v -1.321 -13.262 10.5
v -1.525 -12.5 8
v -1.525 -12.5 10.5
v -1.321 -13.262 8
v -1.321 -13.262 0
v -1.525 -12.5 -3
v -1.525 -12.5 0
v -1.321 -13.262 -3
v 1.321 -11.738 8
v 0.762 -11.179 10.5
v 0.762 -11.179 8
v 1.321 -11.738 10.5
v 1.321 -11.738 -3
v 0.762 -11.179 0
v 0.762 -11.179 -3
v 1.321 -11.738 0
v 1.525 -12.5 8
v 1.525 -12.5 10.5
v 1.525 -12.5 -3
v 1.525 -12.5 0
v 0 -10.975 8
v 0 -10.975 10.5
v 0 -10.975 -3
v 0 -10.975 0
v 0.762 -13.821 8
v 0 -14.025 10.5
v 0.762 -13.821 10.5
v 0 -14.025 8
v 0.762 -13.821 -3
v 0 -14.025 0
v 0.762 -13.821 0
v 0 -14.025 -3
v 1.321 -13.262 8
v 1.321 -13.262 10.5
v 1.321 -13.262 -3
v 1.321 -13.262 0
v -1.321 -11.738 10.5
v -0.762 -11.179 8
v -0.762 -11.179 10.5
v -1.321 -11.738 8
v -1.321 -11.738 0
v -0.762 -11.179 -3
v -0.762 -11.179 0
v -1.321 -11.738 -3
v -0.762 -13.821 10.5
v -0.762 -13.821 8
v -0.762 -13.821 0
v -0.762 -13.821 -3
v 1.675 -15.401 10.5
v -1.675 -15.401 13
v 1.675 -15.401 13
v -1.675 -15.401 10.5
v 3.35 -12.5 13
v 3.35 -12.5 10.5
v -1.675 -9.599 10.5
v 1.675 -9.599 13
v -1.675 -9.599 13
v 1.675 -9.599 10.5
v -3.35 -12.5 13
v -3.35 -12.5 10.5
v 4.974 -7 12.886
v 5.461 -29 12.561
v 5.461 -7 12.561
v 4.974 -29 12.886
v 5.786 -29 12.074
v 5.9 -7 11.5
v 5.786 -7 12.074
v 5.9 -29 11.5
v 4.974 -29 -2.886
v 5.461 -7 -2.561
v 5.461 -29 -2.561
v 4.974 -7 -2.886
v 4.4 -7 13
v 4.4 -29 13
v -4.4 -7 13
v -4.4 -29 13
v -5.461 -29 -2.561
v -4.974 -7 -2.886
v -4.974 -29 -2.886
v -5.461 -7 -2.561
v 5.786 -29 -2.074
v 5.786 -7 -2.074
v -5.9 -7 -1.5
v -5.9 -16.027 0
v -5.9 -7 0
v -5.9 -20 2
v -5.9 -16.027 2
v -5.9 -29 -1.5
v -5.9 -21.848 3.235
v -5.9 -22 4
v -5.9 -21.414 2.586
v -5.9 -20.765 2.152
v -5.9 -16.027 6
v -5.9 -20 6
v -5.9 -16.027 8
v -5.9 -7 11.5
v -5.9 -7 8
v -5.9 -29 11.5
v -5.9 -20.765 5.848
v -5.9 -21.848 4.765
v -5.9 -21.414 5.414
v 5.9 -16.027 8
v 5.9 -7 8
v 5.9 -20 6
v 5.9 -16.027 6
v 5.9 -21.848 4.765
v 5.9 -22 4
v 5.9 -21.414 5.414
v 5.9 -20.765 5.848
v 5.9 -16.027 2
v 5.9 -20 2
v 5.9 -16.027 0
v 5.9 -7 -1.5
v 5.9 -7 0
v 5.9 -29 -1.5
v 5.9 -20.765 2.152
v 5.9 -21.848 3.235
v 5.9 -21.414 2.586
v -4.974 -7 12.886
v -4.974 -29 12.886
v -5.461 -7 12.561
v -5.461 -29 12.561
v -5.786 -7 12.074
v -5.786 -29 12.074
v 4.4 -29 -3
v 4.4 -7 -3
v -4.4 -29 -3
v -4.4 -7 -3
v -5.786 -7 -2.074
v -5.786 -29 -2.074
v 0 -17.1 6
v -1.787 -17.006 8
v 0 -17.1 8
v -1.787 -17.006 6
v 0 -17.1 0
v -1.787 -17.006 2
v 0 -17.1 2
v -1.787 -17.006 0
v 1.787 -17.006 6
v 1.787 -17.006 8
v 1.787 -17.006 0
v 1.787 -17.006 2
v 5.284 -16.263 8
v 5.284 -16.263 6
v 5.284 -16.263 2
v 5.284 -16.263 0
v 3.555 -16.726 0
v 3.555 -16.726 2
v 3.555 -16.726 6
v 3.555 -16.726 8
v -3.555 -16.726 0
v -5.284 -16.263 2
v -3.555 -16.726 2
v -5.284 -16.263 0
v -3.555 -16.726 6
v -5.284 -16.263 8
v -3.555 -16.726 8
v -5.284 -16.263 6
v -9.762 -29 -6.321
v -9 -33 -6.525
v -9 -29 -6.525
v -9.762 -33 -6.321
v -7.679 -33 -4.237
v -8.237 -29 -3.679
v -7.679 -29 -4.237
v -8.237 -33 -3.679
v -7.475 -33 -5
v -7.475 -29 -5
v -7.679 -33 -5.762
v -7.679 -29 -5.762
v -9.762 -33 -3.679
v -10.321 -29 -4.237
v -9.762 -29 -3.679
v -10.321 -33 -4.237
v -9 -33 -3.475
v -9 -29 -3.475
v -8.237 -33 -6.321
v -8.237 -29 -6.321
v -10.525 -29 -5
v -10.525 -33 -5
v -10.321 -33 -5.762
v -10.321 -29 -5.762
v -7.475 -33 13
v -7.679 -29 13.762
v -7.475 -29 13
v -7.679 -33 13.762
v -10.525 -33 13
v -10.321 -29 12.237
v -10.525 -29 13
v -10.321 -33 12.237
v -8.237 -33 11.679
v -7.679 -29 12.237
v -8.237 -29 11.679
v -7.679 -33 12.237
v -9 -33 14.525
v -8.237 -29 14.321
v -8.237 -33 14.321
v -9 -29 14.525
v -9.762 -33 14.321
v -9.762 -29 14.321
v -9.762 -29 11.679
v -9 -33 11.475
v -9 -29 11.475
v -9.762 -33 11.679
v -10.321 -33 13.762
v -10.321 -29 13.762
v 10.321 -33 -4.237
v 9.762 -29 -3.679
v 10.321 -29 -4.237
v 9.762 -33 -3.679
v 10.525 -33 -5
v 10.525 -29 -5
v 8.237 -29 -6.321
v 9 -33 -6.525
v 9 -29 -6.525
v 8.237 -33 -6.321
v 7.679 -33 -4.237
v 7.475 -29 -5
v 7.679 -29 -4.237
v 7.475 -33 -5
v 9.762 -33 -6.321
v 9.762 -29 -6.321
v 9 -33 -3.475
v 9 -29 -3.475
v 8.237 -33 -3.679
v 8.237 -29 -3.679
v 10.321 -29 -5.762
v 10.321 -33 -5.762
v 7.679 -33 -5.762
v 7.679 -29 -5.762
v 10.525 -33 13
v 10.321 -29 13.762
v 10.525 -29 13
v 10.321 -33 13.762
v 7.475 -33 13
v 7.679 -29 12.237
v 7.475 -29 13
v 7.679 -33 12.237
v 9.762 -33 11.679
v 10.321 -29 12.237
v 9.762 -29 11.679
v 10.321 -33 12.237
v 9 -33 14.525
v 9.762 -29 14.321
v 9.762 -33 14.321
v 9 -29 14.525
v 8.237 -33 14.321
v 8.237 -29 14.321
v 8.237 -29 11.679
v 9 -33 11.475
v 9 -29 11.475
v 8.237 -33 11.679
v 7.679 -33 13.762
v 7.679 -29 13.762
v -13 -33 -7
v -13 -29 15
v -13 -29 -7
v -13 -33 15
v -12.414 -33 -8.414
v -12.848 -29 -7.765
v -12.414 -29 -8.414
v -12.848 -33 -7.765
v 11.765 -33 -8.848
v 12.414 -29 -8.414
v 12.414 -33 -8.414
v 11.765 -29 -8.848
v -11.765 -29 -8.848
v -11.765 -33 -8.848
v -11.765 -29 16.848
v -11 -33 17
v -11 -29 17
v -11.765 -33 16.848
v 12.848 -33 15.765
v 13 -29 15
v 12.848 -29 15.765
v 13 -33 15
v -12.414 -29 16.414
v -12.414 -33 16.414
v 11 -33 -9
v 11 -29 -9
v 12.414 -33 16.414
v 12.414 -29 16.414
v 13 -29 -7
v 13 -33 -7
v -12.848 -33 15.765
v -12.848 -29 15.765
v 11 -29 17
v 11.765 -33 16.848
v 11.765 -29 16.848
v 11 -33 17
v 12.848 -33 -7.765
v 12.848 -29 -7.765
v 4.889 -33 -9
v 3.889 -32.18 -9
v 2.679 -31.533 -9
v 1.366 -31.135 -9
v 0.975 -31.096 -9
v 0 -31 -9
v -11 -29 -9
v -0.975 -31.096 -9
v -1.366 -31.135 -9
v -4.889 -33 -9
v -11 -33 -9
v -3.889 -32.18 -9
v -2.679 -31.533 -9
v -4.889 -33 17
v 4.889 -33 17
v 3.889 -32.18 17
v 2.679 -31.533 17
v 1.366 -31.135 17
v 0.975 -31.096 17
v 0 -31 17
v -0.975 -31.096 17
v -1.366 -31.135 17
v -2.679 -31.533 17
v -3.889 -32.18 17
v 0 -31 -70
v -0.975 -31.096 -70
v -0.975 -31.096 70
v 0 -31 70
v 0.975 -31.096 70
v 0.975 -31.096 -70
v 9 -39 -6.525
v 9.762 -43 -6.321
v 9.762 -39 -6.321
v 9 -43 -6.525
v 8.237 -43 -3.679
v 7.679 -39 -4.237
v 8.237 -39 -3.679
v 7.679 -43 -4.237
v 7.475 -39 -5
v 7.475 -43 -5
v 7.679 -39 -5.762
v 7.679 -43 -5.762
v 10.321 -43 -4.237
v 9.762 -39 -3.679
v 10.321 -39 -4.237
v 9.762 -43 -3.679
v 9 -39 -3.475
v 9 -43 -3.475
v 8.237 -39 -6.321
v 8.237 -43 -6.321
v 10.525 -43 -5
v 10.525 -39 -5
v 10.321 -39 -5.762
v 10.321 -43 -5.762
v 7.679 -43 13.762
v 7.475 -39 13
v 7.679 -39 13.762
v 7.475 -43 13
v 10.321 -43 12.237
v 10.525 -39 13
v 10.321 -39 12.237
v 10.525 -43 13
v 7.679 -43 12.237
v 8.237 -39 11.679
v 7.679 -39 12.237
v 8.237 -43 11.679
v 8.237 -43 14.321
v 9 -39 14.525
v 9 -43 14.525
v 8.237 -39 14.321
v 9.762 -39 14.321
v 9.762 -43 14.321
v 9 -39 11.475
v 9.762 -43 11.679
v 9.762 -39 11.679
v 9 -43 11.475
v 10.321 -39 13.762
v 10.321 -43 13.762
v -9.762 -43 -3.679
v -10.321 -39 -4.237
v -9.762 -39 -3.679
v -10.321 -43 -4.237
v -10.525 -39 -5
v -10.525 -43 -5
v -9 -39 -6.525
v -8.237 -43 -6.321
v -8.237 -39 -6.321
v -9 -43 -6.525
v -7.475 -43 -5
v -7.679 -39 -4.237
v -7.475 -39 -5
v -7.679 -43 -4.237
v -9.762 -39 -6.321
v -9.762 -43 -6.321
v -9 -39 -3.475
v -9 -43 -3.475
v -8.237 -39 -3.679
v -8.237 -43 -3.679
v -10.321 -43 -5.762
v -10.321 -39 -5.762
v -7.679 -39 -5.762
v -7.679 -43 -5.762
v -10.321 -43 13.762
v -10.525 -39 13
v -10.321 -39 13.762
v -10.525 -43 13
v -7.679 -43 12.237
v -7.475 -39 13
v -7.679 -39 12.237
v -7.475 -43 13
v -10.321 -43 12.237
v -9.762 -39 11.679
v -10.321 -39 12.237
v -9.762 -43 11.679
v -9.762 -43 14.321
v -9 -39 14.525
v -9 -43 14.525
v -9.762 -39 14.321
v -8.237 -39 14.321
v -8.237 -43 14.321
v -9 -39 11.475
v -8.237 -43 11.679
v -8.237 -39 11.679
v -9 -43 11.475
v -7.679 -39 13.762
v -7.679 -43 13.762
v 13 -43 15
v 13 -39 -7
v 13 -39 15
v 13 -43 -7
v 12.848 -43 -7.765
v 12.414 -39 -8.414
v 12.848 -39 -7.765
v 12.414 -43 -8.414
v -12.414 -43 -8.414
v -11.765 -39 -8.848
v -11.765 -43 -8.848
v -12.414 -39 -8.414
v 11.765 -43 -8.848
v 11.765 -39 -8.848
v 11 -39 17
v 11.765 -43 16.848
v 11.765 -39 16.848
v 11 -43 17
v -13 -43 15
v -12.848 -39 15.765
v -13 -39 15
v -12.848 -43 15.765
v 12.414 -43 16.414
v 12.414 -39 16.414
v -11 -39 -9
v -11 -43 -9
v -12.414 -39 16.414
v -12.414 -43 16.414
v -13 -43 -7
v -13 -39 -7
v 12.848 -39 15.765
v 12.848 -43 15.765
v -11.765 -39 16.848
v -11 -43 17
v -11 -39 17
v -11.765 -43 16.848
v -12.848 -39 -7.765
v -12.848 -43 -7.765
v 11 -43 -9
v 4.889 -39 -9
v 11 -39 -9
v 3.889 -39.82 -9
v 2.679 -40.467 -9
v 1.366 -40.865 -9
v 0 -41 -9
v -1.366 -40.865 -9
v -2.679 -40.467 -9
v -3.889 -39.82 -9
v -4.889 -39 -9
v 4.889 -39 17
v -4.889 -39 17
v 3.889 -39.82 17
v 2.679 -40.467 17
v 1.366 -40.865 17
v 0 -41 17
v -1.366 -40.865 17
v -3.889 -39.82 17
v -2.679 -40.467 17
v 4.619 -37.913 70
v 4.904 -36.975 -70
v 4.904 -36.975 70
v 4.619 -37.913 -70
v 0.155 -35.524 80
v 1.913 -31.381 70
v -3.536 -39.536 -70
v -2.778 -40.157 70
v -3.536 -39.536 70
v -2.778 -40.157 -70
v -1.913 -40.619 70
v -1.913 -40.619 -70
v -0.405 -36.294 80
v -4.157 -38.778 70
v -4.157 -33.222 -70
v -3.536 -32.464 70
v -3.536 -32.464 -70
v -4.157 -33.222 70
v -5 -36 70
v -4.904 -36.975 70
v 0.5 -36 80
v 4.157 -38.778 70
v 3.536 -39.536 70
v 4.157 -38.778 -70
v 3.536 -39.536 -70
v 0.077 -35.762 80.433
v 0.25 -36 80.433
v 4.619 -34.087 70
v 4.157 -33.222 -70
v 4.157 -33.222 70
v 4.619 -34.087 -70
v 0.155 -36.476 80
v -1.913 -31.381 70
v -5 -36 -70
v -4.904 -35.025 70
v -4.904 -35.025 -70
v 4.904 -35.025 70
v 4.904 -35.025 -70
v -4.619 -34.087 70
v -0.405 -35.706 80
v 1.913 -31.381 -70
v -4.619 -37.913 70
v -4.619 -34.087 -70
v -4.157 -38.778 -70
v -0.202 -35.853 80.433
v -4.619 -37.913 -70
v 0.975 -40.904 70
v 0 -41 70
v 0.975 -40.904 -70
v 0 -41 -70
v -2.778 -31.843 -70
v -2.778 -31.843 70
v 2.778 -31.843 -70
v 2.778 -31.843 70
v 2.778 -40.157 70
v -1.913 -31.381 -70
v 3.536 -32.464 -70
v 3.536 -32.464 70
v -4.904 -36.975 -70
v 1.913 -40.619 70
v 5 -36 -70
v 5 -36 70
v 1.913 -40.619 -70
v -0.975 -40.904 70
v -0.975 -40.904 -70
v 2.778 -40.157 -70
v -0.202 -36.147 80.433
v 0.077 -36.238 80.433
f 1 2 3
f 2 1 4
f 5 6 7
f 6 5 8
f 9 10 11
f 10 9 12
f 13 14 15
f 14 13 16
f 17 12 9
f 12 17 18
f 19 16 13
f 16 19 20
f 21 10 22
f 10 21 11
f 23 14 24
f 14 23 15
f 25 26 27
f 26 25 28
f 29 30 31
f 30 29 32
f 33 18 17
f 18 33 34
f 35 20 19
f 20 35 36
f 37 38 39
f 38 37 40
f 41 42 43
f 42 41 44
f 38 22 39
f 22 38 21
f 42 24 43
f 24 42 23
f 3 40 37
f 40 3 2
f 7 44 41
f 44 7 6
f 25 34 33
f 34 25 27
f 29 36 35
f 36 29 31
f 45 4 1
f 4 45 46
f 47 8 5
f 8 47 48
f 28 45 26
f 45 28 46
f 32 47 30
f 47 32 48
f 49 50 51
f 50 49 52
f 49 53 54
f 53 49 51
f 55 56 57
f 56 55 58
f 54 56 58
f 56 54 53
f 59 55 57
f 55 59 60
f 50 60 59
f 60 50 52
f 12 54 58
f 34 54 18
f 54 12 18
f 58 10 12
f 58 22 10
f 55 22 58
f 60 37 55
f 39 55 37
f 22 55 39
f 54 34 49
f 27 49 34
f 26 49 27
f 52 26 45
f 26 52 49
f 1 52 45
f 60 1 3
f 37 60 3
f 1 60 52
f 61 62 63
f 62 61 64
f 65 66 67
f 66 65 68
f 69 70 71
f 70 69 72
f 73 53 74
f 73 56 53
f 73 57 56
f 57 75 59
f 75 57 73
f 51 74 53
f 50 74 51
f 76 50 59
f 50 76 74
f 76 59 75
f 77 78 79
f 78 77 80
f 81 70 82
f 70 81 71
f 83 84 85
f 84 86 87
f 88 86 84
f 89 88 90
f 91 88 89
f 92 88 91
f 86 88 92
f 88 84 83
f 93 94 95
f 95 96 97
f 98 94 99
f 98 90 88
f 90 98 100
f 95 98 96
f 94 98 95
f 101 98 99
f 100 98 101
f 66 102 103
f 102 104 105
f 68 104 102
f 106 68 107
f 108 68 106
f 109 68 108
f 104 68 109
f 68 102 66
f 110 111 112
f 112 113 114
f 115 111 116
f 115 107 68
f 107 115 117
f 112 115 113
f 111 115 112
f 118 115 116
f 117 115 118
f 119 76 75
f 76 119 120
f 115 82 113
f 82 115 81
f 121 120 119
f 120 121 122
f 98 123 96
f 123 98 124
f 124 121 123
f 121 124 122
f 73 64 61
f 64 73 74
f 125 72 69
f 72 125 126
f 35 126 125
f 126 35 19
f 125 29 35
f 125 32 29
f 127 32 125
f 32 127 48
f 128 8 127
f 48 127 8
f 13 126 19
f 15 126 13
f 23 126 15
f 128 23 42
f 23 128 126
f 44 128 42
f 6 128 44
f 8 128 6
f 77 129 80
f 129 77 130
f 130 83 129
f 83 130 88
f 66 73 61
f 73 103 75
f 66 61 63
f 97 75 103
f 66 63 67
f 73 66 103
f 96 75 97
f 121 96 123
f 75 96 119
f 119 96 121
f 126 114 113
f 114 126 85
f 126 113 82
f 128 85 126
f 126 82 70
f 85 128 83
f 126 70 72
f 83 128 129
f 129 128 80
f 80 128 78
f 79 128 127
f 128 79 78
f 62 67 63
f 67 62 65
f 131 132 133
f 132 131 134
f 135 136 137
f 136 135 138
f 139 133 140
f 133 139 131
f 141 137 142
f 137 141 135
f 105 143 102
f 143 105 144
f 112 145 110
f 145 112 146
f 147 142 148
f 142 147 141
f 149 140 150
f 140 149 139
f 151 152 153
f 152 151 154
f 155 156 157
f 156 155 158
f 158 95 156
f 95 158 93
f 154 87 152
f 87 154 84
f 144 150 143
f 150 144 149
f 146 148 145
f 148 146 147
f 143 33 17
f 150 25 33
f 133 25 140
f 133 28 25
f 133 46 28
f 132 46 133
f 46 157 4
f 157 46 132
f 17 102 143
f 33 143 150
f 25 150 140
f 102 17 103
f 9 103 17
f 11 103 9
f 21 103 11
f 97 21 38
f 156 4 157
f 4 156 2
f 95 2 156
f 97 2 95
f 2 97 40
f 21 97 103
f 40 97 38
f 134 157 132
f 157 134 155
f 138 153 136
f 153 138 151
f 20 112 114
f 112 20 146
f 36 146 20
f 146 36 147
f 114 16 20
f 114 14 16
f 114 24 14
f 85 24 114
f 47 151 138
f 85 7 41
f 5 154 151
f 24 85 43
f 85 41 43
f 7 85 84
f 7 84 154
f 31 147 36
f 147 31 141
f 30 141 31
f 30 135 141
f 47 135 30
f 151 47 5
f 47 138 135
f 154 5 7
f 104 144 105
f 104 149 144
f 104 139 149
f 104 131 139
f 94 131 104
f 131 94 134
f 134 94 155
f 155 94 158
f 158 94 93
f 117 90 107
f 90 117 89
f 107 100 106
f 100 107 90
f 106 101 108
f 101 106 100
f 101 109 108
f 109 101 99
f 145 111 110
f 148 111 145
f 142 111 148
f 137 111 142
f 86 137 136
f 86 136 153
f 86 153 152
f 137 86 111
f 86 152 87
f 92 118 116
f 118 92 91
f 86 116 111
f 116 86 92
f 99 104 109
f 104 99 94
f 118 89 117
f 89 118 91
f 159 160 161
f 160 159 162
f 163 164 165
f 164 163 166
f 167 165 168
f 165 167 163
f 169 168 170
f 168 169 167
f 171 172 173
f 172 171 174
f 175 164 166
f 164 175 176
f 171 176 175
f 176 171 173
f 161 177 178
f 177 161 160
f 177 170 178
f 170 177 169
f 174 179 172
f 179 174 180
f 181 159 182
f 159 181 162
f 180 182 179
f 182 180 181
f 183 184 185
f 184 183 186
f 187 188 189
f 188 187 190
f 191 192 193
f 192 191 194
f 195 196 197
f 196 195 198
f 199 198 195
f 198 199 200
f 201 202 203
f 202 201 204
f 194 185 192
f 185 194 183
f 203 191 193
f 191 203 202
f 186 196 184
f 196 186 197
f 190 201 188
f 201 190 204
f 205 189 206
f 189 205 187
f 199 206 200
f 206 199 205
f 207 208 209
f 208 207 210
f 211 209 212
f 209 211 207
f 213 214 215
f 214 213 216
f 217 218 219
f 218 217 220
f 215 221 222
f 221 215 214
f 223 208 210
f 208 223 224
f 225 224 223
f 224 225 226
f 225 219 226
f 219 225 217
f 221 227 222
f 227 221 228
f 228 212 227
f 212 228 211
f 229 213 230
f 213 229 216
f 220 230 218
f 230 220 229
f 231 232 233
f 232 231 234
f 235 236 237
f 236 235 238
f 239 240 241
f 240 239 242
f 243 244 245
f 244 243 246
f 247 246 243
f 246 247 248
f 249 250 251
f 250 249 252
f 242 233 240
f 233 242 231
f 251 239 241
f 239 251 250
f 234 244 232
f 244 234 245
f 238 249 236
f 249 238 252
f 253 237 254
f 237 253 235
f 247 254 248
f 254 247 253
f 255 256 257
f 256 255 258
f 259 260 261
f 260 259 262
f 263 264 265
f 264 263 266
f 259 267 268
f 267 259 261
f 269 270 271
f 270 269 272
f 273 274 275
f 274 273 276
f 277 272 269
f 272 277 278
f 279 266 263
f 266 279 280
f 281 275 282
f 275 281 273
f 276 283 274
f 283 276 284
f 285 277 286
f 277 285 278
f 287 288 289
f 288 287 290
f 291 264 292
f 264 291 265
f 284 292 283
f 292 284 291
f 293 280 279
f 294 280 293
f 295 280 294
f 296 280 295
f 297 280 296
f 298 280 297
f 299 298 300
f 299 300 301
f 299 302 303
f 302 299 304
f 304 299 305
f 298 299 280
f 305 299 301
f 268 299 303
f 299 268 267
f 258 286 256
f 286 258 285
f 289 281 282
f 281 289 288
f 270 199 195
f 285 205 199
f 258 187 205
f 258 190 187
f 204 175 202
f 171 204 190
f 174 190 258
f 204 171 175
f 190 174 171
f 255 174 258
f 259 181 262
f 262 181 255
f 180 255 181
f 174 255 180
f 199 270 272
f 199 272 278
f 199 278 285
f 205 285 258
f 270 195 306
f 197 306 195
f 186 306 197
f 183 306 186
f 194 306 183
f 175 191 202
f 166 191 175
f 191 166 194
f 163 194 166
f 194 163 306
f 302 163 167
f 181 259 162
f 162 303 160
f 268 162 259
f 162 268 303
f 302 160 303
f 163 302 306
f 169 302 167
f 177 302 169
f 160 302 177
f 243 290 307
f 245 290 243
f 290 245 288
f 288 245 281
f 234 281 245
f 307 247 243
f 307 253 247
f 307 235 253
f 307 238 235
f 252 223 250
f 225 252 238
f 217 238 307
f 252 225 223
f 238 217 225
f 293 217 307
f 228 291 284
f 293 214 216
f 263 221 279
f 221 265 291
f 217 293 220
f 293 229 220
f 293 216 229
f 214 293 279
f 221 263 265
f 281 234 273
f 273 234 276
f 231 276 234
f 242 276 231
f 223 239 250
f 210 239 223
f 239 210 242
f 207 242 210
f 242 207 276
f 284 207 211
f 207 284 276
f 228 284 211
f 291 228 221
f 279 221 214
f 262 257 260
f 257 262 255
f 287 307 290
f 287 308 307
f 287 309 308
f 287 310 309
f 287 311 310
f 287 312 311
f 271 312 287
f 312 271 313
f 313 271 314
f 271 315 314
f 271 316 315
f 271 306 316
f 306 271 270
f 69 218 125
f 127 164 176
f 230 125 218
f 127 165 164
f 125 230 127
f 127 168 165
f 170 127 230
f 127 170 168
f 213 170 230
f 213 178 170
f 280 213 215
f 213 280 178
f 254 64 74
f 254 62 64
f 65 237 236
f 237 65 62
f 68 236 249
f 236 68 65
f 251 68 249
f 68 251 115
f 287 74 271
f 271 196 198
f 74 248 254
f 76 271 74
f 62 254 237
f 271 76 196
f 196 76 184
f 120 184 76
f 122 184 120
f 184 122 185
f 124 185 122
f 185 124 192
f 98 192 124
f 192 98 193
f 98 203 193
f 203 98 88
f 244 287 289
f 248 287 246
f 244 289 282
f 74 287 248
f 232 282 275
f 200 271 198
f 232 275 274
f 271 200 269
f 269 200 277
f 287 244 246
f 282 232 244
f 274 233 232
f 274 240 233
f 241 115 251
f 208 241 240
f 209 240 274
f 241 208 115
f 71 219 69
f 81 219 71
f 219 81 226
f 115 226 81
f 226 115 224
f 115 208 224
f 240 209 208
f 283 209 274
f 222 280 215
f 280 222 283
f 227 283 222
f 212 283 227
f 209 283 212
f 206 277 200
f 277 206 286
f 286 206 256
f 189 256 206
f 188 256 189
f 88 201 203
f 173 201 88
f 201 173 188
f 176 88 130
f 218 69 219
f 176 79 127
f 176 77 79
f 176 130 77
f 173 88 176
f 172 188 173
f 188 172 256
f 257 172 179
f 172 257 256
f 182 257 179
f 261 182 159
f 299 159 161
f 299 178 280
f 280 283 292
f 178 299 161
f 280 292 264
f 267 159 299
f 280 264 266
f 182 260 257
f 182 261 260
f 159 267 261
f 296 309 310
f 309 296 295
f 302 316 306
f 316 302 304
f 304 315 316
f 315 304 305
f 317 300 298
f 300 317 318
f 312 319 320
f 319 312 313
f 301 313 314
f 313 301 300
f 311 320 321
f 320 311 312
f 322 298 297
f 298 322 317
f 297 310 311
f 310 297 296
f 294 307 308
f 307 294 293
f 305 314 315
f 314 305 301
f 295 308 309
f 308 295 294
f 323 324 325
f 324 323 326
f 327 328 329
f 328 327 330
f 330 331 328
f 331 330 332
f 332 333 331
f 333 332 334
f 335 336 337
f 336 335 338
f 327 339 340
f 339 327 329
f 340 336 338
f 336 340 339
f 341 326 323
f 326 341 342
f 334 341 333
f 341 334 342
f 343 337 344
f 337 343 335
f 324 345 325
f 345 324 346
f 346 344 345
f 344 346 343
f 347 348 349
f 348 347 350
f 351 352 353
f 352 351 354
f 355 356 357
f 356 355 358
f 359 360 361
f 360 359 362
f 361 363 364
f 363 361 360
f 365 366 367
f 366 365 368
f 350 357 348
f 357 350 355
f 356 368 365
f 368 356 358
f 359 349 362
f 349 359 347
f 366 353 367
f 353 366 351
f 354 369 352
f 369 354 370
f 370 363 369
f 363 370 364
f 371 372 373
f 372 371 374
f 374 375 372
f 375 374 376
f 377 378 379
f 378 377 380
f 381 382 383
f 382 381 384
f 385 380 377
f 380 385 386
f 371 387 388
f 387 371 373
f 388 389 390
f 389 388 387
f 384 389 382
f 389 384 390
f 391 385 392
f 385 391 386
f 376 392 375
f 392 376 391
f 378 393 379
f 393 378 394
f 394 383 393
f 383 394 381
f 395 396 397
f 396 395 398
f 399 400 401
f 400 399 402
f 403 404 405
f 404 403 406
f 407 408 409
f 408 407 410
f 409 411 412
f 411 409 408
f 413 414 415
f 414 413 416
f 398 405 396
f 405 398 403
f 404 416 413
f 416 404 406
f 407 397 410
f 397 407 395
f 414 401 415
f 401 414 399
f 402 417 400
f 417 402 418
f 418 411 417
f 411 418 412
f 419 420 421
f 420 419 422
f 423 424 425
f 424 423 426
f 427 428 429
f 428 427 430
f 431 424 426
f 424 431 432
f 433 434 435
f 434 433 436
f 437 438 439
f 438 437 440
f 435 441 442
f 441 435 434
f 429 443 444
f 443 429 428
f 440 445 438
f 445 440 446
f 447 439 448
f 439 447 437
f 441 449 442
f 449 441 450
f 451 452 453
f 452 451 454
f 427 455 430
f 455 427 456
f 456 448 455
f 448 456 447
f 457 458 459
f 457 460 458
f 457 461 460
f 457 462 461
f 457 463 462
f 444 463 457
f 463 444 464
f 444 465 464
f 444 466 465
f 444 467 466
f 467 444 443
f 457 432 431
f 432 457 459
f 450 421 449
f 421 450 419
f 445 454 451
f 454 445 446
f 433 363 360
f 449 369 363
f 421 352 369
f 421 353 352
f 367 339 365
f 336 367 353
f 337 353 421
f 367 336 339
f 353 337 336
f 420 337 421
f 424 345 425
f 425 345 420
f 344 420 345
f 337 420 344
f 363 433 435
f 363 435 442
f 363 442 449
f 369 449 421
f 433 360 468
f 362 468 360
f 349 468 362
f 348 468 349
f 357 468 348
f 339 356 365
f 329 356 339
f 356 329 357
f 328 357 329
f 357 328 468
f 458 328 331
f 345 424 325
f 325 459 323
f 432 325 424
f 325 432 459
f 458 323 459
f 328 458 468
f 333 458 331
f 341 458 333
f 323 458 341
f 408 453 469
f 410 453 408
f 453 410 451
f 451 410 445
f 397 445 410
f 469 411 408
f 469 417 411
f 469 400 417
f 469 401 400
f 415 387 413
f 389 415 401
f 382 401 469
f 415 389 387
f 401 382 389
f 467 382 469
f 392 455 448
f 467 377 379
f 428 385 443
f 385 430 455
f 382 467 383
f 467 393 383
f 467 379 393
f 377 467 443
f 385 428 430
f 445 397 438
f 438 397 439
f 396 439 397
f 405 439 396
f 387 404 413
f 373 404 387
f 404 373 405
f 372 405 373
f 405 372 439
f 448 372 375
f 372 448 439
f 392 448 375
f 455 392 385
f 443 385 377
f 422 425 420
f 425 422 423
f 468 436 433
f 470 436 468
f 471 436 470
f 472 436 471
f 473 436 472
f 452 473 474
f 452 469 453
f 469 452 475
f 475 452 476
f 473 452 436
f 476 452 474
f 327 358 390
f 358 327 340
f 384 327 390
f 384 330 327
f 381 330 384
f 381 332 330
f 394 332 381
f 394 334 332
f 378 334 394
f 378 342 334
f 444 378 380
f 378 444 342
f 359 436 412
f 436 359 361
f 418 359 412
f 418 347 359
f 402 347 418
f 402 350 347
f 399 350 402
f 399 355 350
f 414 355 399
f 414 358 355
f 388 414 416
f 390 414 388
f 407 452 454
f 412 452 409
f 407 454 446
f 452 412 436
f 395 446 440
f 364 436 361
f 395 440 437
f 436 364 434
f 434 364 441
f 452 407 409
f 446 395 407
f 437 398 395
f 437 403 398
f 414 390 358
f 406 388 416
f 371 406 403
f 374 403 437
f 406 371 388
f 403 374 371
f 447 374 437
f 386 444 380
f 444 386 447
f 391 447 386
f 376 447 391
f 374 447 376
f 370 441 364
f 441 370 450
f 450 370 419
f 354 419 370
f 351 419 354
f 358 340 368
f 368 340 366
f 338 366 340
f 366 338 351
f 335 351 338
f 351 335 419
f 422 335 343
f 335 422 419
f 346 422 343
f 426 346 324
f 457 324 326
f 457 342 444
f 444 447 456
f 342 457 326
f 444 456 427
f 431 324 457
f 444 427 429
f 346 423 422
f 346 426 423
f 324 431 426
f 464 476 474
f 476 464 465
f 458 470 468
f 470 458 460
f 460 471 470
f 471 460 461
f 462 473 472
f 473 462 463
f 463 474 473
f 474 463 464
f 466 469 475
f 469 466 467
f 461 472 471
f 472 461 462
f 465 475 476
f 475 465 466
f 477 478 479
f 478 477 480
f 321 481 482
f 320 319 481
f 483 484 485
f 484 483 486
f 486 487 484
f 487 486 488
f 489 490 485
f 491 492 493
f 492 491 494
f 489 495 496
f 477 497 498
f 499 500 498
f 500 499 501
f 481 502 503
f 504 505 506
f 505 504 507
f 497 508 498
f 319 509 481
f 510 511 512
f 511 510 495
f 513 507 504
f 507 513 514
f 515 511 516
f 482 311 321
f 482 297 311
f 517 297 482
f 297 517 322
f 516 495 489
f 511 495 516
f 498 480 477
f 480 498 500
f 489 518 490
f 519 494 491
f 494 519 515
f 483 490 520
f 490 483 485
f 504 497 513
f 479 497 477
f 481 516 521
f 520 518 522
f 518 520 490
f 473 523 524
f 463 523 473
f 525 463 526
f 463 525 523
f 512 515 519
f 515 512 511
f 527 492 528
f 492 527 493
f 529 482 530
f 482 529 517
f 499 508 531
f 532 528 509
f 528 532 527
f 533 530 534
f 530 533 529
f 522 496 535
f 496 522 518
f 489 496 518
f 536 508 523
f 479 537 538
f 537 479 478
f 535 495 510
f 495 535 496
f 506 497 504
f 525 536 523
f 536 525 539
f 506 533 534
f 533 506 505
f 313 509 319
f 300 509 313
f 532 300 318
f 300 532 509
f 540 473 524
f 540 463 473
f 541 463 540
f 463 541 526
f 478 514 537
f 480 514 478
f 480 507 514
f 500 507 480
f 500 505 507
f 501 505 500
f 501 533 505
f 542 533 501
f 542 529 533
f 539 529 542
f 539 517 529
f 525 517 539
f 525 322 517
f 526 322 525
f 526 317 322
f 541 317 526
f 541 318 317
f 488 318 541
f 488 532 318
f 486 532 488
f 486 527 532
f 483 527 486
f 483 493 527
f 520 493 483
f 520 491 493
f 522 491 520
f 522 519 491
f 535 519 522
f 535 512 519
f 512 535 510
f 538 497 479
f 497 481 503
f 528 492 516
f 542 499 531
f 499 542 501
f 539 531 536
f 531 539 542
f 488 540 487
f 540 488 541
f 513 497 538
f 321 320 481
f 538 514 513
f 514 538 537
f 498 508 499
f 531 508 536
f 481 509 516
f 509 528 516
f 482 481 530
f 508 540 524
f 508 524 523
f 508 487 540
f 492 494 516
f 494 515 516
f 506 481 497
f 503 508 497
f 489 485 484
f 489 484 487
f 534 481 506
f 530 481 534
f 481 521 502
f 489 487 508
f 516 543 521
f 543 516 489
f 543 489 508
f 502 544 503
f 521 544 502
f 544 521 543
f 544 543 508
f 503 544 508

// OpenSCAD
// file: retainer.scad
include <configuration.scad>;

offset = 20;  // Same as DELTA_EFFECTOR_OFFSET in Marlin.
mount_radius = 12.5;  // Hotend mounting screws, standard would be 25mm.
height = 5;

groove_radius = 6;

probe_angle = 240;
probe_spring_radius = 2.5;
probe_spring_recess_depth = 2;

nut_slot_height = 2.7;
layer_height = 0.2;

module retainer() {
  difference() {
    union() {
      cylinder(r=offset-3, h=height, center=true, $fn=60);
      rotate([0, 0, probe_angle]) {
        translate([0, mount_radius+probe_excentricity, 0])
          cylinder(r=probe_tunnel_radius*3, h=height, center=true, $fn=12);
      }
    }
    cylinder(r=groove_radius + extra_radius, h=height+1, center=true);
    for (a = [0:60:359]) if (a != probe_angle) rotate([0, 0, a]) {
      translate([0, mount_radius, 0]) {
        translate([0,0,-height/2 - 0.01]) {
           nut_slot();
           cylinder(r=m3_wide_radius, h=2*height,$fn=12);
        }
      }
    }
    rotate([0, 0, probe_angle]) {
      translate([0, mount_radius+probe_excentricity, 0])
        union() {
          cylinder(r=probe_tunnel_radius, h=2*height, center=true, $fn=12);
          translate([0, 0, -height/2])
            cylinder(r=probe_spring_radius, h=probe_spring_recess_depth, center=true, $fn=12);
        }
    }
    // Groove mount insert slot.
    translate([0, 10, 0])
      cube([2*groove_radius, 20, 20], center=true);
  }
}

module nut_slot(radius=m3_nut_tight_radius,height=nut_slot_height) {
	rotate([0,0,30])
		cylinder(r=m3_nut_tight_radius, h=nut_slot_height, $fn=6);
}

translate([0, 0, height/2])
rotate([180,0,0])
  retainer();
// file: configuration.scad
// Increase this if your slicer or printer make holes too tight.
extra_radius = 0.1;

// OD = outside diameter, corner to corner.
m3_nut_od = 6.1;
m3_nut_radius = m3_nut_od/2 + 0.2 + extra_radius;
m3_nut_tight_radius = m3_nut_radius - extra_radius/2;
m3_washer_radius = 3.5 + extra_radius;

// Major diameter of metric 3mm thread.
m3_major = 2.85;
m3_radius = m3_major/2 + extra_radius;
m3_wide_radius = m3_major/2 + extra_radius + 0.2;

// NEMA17 stepper motors.
motor_shaft_diameter = 5;
motor_shaft_radius = motor_shaft_diameter/2 + extra_radius;

// Frame brackets. M3x8mm screws work best with 3.6 mm brackets.
thickness = 3.6;

// OpenBeam or Misumi. Currently only 15x15 mm, but there is a plan
// to make models more parametric and allow 20x20 mm in the future.
extrusion = 15;

// Placement for the NEMA17 stepper motors.
motor_offset = 44;
motor_length = 47;

probe_tunnel_radius = 1.25 + extra_radius;
probe_excentricity = 5;
// main file
include <configuration.scad>;
use <retainer.scad>

separation = 40;  // Distance between ball joint mounting faces.
offset = 20;  // Same as DELTA_EFFECTOR_OFFSET in Marlin.
mount_radius = 12.5;  // Hotend mounting screws, standard would be 25mm.
hotend_radius = 8;  // Hole for the hotend (J-Head diameter is 16mm).
push_fit_height = 4;  // Length of brass threaded into printed plastic.
push_fit_radius = 5;
height = 8;
cone_r1 = 2.5;
cone_r2 = 14;

probe_angle = 60; // angle where the Z-probe goes through effector

hotend_top_shelf_height = 3.7;


module effector() {
  difference() {
    union() {
      cylinder(r=offset-3, h=height, center=true, $fn=60);
      for (a = [60:120:359]) rotate([0, 0, a]) {
        rotate([0, 0, 30]) translate([offset-2, 0, 0])
          cube([10, 13, height], center=true);
        for (s = [-1, 1]) scale([s, 1, 1]) {
          translate([0, offset, 0]) difference() {
            intersection() {
              cube([separation, 40, height], center=true);
              translate([0, -4, 0]) rotate([0, 90, 0])
                cylinder(r=10, h=separation, center=true);
              translate([separation/2-7, 0, 0]) rotate([0, 90, 0])
                cylinder(r1=cone_r2, r2=cone_r1, h=14, center=true, $fn=24);
            }
            rotate([0, 90, 0])
              cylinder(r=m3_radius, h=separation+1, center=true, $fn=12);
            rotate([90, 0, 90])
              cylinder(r=m3_nut_radius, h=separation-24, center=true, $fn=6);
          }
        }
      }
    }
    translate([0, 0, height/2 - hotend_top_shelf_height])
      cylinder(r=hotend_radius + 2*extra_radius, h=height, $fn=36);
    translate([0, 0, -6]) cylinder(r=push_fit_radius, h=height);
    for (a = [0:60:359]) rotate([0, 0, a]) {
      if (a != probe_angle)
        translate([0, mount_radius, 0])
          cylinder(r=m3_wide_radius, h=2*height, center=true, $fn=12);
    }
    rotate([0, 0, probe_angle]) {
      translate([0, mount_radius+probe_excentricity, 0])
        cylinder(r=probe_tunnel_radius+0.1, h=2*height, center=true, $fn=12);
    }
  }
}

module e3dv6() {
    translate([0, 0, -17.66])
    rotate([90, 0, 0])
    color("lightgrey")
    import("E3D_V6_1.75mm_Universal_HotEnd_Mockup.stl");
}

module pen() {
    color("grey")
    hull() {
        cylinder(h=140, d=10, $fn=32);
        translate([0, 0, 150])
        sphere(d=1);
    }
}

module pen_plate() {
    difference() {
        union() {
            hull() for(x=[-1,1]) for(z=[-1,1])
            translate([x*11, -11, z*11])
            rotate([90, 0, 0])
            cylinder(h=4, d=4, $fn=16, center = true);
        }

        // pen plate holes
        for(x=[-1,1]) for(z=[-1,1])
            translate([x*9, -10, z*9])
            rotate([90, 0, 0])
            cylinder(r=m3_radius, h=10, center=true, $fn=12);
        
        // pen recess
        translate([0, -18, 0])
        cylinder(h=50, d=14, $fn=32, center=true);
    }
}

module pen_holder() {
    difference() {
        union() {
            // holder body
            hull() for(x=[-1,1]) for(z=[-1,1])
            translate([x*4.4, 1, z*6.5+1])
            rotate([90, 0, 0])
            cylinder(d=3, h=24, center=true, $fn=16);
        }

        // space for effector body
        translate([0, 20, 0])
        cylinder(r=offset-3+0.1, h=height, center=true, $fn=60);
        
        // space for effector screws
        hull() for(y=[0,5])
        translate([0, y, 0])
        rotate([0, 90, 0])
        cylinder(d=4, h=20, $fn=16, center=true);
        
        // vertical screw hole
        translate([0, 7.5, 0]) {
            cylinder(r=m3_radius, h=30, center=true, $fn=12);
            translate([0, 0, 6.5])
            cylinder(r=m3_nut_radius, h=4, center=false, $fn=6);
        }

    }

    pen_plate();
}

translate([0, 0, height/2]) effector();
translate([0, 0, 8])
rotate([180, 0, 0]) {
    e3dv6();
    translate([0, 0, -2.6])
    retainer();
}


!translate([0, -20, 4]) {
    color("green") {
        translate([0, 0, 0]) 
        pen_holder();

        translate([0, -32, 0])
        rotate([0, 0, 180])
        pen_plate();
    }

    translate([0, -16, -74])
    pen();
}
